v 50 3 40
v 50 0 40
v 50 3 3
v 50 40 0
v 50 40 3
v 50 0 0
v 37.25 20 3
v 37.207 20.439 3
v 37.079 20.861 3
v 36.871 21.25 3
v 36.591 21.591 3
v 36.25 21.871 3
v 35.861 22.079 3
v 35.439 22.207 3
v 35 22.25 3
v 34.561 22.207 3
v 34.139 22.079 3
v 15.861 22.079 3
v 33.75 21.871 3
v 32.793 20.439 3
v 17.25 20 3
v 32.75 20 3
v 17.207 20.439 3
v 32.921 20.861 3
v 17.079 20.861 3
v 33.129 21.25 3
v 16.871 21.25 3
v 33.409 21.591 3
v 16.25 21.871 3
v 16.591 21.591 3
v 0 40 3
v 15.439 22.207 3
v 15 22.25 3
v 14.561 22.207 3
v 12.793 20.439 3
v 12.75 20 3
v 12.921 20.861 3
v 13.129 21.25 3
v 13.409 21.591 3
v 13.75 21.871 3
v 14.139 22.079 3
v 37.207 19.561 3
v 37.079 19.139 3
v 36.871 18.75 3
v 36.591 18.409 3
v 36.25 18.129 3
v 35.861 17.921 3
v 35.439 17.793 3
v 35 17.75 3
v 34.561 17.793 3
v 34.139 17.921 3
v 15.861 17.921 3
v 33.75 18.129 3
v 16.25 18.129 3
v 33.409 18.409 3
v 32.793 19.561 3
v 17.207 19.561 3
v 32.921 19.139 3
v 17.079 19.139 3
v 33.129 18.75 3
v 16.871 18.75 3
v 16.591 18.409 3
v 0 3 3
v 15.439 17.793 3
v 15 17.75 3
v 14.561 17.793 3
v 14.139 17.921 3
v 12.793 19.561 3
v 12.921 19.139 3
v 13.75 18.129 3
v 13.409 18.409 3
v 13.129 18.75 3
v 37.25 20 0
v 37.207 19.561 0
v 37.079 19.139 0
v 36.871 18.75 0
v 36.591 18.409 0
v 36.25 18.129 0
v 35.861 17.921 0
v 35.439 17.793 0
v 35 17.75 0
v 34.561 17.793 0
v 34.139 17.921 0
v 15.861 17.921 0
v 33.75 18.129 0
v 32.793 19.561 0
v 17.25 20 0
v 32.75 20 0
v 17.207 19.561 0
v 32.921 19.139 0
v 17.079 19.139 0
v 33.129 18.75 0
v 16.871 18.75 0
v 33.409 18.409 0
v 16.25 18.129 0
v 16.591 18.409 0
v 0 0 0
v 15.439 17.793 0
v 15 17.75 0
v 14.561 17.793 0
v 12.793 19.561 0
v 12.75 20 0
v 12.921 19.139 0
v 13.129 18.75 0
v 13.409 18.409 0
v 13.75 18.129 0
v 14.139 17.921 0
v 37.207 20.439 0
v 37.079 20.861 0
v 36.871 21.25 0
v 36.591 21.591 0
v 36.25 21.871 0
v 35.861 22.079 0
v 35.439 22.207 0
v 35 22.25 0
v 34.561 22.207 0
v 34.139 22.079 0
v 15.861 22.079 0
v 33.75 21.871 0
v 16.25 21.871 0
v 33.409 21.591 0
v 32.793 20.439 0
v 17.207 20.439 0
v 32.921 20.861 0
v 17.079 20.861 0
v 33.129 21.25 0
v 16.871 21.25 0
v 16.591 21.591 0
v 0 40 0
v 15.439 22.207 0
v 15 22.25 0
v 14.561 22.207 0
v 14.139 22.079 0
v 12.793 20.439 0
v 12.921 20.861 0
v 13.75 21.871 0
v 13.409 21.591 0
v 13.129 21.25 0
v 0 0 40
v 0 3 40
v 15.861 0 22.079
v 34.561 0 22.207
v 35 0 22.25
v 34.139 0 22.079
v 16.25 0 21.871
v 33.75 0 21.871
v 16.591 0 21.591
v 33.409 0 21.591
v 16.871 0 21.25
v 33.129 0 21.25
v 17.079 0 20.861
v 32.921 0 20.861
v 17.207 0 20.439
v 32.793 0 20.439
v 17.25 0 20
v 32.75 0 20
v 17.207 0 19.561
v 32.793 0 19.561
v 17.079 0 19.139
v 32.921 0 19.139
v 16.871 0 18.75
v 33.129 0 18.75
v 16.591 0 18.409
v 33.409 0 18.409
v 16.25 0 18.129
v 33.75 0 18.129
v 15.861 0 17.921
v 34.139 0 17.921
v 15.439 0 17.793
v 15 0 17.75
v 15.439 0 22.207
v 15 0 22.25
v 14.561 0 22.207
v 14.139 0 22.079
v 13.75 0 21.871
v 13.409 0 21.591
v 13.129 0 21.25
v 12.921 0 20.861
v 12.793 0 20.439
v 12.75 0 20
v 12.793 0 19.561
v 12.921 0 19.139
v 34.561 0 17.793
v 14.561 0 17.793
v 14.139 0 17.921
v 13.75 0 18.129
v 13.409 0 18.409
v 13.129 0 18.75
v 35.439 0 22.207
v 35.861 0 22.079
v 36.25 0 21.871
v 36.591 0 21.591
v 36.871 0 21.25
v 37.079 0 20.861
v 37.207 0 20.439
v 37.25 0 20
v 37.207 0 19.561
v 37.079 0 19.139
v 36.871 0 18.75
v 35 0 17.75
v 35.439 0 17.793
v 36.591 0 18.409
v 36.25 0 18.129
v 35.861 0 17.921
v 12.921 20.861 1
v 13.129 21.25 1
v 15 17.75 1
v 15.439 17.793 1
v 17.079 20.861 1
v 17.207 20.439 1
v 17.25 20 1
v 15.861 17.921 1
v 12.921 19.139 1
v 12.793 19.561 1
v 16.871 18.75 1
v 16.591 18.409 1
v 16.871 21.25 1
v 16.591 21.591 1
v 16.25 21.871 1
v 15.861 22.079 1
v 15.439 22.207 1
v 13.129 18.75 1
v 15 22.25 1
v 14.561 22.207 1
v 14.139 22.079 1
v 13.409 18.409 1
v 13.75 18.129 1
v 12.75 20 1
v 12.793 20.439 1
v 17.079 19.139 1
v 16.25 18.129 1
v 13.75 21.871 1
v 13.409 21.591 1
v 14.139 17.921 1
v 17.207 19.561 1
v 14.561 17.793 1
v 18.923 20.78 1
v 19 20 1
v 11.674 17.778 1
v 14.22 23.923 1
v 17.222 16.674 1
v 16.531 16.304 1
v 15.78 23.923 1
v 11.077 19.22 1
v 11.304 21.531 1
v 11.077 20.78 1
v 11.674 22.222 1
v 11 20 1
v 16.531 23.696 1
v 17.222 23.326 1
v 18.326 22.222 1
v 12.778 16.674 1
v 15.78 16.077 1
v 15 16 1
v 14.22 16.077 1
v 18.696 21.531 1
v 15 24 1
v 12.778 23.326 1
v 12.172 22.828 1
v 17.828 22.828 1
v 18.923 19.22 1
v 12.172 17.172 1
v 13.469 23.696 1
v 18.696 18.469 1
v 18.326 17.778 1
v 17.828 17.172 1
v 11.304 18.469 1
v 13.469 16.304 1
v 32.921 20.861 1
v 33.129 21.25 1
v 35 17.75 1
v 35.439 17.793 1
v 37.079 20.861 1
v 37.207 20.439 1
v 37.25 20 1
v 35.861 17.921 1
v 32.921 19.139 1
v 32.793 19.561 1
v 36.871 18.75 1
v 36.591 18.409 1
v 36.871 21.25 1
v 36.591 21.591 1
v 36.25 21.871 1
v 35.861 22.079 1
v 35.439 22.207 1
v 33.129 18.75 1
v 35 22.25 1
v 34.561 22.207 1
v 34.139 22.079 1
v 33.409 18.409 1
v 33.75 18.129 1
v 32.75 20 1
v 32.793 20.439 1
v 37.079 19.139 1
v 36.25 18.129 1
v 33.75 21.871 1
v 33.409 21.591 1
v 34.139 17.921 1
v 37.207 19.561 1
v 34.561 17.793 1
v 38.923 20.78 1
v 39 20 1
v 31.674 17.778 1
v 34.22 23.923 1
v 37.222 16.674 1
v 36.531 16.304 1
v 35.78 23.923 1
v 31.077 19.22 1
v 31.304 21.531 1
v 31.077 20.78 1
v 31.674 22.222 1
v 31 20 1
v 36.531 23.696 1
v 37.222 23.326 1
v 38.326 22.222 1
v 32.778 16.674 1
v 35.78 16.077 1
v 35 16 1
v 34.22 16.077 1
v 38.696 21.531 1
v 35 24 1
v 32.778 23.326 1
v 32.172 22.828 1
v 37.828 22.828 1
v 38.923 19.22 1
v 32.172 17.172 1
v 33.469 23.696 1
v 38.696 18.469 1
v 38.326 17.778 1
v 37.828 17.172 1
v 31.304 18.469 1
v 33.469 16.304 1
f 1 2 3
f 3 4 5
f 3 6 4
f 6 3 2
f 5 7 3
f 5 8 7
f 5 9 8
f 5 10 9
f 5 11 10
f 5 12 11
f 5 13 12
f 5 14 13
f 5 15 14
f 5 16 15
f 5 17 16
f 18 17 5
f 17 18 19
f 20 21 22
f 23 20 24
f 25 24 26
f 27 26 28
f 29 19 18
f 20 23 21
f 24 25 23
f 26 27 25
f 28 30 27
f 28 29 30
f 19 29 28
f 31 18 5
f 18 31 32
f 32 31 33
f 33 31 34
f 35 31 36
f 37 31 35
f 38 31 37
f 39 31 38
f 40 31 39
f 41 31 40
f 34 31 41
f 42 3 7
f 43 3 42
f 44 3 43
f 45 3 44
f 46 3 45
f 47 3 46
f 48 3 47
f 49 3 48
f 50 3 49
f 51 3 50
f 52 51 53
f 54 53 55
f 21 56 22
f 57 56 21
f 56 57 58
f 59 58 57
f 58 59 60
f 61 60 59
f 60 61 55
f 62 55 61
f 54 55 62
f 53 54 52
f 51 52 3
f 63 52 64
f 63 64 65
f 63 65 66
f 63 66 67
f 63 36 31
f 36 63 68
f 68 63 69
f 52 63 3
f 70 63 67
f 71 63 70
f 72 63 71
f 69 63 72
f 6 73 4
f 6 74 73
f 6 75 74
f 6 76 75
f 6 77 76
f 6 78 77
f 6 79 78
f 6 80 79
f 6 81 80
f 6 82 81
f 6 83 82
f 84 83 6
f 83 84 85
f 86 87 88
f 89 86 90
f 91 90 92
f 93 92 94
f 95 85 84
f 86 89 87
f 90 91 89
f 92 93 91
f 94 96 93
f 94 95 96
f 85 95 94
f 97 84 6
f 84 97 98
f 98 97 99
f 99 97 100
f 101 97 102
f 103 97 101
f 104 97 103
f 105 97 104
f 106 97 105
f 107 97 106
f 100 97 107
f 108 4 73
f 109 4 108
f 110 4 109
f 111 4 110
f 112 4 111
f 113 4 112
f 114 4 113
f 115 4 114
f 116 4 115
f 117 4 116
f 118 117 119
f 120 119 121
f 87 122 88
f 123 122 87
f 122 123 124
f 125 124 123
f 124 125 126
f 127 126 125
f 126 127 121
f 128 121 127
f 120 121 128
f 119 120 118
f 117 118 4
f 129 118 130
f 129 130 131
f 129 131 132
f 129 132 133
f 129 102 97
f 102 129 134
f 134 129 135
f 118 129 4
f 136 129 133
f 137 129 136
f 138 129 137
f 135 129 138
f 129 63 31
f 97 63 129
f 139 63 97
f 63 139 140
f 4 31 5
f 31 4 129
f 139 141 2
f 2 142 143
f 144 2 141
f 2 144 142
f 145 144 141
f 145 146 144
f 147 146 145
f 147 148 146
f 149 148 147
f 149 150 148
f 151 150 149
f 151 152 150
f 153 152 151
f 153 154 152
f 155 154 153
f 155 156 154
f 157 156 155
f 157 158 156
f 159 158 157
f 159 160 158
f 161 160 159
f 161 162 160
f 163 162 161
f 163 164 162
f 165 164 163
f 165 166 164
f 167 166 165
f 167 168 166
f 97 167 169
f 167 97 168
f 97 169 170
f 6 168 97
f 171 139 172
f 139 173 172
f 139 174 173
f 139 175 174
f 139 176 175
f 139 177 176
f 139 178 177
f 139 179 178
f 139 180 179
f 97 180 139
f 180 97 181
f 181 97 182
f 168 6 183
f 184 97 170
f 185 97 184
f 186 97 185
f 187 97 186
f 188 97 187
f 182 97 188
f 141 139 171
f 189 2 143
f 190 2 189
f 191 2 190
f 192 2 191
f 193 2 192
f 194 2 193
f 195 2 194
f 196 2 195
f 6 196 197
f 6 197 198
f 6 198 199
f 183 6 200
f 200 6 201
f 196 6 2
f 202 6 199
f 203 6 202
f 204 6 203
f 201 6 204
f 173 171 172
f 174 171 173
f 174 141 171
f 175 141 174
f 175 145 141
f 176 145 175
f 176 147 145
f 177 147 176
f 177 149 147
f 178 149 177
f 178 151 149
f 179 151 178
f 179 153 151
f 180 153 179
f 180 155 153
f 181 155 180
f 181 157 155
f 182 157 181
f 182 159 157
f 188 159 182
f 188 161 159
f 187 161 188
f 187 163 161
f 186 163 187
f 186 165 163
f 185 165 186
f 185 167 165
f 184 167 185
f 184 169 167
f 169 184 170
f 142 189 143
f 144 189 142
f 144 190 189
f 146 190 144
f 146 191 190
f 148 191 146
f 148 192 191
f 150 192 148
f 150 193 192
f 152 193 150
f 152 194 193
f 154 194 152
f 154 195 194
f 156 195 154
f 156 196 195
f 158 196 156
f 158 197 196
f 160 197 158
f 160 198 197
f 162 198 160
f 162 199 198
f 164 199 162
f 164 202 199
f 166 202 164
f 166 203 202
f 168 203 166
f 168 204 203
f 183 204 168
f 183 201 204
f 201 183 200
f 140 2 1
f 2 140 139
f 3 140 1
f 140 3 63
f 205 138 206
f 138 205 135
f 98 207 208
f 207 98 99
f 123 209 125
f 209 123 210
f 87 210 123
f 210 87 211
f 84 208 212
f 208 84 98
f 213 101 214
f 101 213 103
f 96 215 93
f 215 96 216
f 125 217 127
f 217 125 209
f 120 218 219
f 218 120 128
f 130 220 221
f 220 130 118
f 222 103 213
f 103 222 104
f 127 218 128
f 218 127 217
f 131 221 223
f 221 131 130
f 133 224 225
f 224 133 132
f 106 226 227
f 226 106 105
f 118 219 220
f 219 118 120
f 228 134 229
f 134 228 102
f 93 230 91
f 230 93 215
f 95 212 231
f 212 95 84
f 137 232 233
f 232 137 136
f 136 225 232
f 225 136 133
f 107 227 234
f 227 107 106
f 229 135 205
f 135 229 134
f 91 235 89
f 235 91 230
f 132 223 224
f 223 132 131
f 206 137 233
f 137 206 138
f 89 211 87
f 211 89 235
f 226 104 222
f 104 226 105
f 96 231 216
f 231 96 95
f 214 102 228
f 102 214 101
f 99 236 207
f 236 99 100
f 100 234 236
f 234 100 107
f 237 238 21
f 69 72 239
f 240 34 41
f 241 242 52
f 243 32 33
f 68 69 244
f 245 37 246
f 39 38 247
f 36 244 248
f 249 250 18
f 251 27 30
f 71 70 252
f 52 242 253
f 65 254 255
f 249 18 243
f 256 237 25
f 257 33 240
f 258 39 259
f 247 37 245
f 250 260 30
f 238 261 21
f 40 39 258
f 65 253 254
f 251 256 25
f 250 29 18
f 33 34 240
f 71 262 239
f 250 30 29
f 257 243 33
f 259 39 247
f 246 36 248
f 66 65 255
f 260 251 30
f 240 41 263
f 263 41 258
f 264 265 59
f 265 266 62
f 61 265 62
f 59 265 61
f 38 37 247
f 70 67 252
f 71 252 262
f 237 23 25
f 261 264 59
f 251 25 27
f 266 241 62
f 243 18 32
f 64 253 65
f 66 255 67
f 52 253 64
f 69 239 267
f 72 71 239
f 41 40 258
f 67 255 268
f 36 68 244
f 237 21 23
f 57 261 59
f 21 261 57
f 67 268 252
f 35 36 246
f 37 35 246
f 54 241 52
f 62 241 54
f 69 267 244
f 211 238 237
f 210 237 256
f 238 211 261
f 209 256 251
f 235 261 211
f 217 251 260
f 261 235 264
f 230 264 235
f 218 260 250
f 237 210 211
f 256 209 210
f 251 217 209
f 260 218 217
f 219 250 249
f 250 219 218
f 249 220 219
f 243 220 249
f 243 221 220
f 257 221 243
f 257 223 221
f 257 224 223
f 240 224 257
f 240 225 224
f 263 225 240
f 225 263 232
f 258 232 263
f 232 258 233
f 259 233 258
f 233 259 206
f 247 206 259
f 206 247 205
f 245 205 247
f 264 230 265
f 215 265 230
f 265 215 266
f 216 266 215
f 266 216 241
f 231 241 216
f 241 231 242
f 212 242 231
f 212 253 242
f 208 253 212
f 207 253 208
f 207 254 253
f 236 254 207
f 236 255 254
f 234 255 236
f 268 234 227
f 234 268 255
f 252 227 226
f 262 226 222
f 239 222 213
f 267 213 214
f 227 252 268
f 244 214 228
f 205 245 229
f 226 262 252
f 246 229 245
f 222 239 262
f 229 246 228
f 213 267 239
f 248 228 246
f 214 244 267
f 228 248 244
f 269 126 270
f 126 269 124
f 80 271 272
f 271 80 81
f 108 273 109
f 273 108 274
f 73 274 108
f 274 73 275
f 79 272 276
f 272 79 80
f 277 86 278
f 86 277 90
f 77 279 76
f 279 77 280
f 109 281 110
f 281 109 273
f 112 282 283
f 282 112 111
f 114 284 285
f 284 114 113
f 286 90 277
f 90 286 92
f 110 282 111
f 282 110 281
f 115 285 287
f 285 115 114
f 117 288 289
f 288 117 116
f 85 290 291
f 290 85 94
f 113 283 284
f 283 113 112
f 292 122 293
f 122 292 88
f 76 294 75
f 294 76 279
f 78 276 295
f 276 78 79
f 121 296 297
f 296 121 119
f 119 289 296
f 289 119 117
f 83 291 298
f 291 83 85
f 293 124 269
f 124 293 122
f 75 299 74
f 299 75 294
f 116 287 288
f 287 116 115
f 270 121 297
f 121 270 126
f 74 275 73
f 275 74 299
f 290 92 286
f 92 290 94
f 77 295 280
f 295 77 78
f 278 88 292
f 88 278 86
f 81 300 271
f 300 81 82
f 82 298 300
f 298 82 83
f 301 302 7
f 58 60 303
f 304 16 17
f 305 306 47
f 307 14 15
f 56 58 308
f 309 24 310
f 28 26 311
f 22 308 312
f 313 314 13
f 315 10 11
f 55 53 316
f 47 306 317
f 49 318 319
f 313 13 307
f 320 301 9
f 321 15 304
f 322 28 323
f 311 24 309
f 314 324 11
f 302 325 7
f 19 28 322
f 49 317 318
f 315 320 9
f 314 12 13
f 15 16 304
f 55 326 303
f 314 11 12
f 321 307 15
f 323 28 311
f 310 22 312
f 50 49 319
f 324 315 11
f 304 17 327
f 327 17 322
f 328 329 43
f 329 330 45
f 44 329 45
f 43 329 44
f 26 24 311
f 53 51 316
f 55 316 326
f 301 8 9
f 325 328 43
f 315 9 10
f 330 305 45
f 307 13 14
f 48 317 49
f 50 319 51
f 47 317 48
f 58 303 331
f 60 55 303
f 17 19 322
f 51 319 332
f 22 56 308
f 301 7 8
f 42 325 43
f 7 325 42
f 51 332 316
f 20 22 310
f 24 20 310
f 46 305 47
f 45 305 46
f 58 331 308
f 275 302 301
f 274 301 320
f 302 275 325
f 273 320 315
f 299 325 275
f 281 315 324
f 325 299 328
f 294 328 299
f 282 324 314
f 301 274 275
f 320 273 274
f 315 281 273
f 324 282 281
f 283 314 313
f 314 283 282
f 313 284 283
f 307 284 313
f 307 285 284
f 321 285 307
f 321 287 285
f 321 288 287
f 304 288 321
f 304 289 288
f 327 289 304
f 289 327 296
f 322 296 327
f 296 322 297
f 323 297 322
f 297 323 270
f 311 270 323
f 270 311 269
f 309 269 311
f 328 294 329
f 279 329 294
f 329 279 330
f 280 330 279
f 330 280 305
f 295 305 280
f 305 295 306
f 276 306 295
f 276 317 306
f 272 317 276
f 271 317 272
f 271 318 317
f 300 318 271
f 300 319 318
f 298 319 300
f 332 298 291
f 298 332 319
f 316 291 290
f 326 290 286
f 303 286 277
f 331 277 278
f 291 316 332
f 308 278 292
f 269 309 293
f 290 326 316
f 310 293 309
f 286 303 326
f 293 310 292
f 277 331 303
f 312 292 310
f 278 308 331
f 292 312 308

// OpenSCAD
// L-bracket with countersunk holes

module countersunk_hole(through_dia, counter_dia, counter_depth, total_depth) {
    translate([0, 0, -total_depth]) {
        cylinder(h = total_depth, d = through_dia, $fn = 32);
    }
    translate([0, 0, -counter_depth]) {
        cylinder(h = counter_depth, d1 = counter_dia, d2 = through_dia, $fn = 32);
    }
}

module l_bracket() {
    difference() {
        union() {
            // Horizontal flange
            cube([50, 40, 3]);
            
            // Vertical flange
            cube([50, 3, 40]);
        }
        
        // Horizontal flange holes
        translate([15, 20, 3]) {
            countersunk_hole(4.5, 8, 2, 3);
        }
        translate([35, 20, 3]) {
            countersunk_hole(4.5, 8, 2, 3);
        }
        
        // Vertical flange holes
        translate([15, 0, 20]) {
            rotate([-90, 0, 0]) {
                countersunk_hole(4.5, 8, 2, 3);
            }
        }
        translate([35, 0, 20]) {
            rotate([-90, 0, 0]) {
                countersunk_hole(4.5, 8, 2, 3);
            }
        }
    }
}

l_bracket();
